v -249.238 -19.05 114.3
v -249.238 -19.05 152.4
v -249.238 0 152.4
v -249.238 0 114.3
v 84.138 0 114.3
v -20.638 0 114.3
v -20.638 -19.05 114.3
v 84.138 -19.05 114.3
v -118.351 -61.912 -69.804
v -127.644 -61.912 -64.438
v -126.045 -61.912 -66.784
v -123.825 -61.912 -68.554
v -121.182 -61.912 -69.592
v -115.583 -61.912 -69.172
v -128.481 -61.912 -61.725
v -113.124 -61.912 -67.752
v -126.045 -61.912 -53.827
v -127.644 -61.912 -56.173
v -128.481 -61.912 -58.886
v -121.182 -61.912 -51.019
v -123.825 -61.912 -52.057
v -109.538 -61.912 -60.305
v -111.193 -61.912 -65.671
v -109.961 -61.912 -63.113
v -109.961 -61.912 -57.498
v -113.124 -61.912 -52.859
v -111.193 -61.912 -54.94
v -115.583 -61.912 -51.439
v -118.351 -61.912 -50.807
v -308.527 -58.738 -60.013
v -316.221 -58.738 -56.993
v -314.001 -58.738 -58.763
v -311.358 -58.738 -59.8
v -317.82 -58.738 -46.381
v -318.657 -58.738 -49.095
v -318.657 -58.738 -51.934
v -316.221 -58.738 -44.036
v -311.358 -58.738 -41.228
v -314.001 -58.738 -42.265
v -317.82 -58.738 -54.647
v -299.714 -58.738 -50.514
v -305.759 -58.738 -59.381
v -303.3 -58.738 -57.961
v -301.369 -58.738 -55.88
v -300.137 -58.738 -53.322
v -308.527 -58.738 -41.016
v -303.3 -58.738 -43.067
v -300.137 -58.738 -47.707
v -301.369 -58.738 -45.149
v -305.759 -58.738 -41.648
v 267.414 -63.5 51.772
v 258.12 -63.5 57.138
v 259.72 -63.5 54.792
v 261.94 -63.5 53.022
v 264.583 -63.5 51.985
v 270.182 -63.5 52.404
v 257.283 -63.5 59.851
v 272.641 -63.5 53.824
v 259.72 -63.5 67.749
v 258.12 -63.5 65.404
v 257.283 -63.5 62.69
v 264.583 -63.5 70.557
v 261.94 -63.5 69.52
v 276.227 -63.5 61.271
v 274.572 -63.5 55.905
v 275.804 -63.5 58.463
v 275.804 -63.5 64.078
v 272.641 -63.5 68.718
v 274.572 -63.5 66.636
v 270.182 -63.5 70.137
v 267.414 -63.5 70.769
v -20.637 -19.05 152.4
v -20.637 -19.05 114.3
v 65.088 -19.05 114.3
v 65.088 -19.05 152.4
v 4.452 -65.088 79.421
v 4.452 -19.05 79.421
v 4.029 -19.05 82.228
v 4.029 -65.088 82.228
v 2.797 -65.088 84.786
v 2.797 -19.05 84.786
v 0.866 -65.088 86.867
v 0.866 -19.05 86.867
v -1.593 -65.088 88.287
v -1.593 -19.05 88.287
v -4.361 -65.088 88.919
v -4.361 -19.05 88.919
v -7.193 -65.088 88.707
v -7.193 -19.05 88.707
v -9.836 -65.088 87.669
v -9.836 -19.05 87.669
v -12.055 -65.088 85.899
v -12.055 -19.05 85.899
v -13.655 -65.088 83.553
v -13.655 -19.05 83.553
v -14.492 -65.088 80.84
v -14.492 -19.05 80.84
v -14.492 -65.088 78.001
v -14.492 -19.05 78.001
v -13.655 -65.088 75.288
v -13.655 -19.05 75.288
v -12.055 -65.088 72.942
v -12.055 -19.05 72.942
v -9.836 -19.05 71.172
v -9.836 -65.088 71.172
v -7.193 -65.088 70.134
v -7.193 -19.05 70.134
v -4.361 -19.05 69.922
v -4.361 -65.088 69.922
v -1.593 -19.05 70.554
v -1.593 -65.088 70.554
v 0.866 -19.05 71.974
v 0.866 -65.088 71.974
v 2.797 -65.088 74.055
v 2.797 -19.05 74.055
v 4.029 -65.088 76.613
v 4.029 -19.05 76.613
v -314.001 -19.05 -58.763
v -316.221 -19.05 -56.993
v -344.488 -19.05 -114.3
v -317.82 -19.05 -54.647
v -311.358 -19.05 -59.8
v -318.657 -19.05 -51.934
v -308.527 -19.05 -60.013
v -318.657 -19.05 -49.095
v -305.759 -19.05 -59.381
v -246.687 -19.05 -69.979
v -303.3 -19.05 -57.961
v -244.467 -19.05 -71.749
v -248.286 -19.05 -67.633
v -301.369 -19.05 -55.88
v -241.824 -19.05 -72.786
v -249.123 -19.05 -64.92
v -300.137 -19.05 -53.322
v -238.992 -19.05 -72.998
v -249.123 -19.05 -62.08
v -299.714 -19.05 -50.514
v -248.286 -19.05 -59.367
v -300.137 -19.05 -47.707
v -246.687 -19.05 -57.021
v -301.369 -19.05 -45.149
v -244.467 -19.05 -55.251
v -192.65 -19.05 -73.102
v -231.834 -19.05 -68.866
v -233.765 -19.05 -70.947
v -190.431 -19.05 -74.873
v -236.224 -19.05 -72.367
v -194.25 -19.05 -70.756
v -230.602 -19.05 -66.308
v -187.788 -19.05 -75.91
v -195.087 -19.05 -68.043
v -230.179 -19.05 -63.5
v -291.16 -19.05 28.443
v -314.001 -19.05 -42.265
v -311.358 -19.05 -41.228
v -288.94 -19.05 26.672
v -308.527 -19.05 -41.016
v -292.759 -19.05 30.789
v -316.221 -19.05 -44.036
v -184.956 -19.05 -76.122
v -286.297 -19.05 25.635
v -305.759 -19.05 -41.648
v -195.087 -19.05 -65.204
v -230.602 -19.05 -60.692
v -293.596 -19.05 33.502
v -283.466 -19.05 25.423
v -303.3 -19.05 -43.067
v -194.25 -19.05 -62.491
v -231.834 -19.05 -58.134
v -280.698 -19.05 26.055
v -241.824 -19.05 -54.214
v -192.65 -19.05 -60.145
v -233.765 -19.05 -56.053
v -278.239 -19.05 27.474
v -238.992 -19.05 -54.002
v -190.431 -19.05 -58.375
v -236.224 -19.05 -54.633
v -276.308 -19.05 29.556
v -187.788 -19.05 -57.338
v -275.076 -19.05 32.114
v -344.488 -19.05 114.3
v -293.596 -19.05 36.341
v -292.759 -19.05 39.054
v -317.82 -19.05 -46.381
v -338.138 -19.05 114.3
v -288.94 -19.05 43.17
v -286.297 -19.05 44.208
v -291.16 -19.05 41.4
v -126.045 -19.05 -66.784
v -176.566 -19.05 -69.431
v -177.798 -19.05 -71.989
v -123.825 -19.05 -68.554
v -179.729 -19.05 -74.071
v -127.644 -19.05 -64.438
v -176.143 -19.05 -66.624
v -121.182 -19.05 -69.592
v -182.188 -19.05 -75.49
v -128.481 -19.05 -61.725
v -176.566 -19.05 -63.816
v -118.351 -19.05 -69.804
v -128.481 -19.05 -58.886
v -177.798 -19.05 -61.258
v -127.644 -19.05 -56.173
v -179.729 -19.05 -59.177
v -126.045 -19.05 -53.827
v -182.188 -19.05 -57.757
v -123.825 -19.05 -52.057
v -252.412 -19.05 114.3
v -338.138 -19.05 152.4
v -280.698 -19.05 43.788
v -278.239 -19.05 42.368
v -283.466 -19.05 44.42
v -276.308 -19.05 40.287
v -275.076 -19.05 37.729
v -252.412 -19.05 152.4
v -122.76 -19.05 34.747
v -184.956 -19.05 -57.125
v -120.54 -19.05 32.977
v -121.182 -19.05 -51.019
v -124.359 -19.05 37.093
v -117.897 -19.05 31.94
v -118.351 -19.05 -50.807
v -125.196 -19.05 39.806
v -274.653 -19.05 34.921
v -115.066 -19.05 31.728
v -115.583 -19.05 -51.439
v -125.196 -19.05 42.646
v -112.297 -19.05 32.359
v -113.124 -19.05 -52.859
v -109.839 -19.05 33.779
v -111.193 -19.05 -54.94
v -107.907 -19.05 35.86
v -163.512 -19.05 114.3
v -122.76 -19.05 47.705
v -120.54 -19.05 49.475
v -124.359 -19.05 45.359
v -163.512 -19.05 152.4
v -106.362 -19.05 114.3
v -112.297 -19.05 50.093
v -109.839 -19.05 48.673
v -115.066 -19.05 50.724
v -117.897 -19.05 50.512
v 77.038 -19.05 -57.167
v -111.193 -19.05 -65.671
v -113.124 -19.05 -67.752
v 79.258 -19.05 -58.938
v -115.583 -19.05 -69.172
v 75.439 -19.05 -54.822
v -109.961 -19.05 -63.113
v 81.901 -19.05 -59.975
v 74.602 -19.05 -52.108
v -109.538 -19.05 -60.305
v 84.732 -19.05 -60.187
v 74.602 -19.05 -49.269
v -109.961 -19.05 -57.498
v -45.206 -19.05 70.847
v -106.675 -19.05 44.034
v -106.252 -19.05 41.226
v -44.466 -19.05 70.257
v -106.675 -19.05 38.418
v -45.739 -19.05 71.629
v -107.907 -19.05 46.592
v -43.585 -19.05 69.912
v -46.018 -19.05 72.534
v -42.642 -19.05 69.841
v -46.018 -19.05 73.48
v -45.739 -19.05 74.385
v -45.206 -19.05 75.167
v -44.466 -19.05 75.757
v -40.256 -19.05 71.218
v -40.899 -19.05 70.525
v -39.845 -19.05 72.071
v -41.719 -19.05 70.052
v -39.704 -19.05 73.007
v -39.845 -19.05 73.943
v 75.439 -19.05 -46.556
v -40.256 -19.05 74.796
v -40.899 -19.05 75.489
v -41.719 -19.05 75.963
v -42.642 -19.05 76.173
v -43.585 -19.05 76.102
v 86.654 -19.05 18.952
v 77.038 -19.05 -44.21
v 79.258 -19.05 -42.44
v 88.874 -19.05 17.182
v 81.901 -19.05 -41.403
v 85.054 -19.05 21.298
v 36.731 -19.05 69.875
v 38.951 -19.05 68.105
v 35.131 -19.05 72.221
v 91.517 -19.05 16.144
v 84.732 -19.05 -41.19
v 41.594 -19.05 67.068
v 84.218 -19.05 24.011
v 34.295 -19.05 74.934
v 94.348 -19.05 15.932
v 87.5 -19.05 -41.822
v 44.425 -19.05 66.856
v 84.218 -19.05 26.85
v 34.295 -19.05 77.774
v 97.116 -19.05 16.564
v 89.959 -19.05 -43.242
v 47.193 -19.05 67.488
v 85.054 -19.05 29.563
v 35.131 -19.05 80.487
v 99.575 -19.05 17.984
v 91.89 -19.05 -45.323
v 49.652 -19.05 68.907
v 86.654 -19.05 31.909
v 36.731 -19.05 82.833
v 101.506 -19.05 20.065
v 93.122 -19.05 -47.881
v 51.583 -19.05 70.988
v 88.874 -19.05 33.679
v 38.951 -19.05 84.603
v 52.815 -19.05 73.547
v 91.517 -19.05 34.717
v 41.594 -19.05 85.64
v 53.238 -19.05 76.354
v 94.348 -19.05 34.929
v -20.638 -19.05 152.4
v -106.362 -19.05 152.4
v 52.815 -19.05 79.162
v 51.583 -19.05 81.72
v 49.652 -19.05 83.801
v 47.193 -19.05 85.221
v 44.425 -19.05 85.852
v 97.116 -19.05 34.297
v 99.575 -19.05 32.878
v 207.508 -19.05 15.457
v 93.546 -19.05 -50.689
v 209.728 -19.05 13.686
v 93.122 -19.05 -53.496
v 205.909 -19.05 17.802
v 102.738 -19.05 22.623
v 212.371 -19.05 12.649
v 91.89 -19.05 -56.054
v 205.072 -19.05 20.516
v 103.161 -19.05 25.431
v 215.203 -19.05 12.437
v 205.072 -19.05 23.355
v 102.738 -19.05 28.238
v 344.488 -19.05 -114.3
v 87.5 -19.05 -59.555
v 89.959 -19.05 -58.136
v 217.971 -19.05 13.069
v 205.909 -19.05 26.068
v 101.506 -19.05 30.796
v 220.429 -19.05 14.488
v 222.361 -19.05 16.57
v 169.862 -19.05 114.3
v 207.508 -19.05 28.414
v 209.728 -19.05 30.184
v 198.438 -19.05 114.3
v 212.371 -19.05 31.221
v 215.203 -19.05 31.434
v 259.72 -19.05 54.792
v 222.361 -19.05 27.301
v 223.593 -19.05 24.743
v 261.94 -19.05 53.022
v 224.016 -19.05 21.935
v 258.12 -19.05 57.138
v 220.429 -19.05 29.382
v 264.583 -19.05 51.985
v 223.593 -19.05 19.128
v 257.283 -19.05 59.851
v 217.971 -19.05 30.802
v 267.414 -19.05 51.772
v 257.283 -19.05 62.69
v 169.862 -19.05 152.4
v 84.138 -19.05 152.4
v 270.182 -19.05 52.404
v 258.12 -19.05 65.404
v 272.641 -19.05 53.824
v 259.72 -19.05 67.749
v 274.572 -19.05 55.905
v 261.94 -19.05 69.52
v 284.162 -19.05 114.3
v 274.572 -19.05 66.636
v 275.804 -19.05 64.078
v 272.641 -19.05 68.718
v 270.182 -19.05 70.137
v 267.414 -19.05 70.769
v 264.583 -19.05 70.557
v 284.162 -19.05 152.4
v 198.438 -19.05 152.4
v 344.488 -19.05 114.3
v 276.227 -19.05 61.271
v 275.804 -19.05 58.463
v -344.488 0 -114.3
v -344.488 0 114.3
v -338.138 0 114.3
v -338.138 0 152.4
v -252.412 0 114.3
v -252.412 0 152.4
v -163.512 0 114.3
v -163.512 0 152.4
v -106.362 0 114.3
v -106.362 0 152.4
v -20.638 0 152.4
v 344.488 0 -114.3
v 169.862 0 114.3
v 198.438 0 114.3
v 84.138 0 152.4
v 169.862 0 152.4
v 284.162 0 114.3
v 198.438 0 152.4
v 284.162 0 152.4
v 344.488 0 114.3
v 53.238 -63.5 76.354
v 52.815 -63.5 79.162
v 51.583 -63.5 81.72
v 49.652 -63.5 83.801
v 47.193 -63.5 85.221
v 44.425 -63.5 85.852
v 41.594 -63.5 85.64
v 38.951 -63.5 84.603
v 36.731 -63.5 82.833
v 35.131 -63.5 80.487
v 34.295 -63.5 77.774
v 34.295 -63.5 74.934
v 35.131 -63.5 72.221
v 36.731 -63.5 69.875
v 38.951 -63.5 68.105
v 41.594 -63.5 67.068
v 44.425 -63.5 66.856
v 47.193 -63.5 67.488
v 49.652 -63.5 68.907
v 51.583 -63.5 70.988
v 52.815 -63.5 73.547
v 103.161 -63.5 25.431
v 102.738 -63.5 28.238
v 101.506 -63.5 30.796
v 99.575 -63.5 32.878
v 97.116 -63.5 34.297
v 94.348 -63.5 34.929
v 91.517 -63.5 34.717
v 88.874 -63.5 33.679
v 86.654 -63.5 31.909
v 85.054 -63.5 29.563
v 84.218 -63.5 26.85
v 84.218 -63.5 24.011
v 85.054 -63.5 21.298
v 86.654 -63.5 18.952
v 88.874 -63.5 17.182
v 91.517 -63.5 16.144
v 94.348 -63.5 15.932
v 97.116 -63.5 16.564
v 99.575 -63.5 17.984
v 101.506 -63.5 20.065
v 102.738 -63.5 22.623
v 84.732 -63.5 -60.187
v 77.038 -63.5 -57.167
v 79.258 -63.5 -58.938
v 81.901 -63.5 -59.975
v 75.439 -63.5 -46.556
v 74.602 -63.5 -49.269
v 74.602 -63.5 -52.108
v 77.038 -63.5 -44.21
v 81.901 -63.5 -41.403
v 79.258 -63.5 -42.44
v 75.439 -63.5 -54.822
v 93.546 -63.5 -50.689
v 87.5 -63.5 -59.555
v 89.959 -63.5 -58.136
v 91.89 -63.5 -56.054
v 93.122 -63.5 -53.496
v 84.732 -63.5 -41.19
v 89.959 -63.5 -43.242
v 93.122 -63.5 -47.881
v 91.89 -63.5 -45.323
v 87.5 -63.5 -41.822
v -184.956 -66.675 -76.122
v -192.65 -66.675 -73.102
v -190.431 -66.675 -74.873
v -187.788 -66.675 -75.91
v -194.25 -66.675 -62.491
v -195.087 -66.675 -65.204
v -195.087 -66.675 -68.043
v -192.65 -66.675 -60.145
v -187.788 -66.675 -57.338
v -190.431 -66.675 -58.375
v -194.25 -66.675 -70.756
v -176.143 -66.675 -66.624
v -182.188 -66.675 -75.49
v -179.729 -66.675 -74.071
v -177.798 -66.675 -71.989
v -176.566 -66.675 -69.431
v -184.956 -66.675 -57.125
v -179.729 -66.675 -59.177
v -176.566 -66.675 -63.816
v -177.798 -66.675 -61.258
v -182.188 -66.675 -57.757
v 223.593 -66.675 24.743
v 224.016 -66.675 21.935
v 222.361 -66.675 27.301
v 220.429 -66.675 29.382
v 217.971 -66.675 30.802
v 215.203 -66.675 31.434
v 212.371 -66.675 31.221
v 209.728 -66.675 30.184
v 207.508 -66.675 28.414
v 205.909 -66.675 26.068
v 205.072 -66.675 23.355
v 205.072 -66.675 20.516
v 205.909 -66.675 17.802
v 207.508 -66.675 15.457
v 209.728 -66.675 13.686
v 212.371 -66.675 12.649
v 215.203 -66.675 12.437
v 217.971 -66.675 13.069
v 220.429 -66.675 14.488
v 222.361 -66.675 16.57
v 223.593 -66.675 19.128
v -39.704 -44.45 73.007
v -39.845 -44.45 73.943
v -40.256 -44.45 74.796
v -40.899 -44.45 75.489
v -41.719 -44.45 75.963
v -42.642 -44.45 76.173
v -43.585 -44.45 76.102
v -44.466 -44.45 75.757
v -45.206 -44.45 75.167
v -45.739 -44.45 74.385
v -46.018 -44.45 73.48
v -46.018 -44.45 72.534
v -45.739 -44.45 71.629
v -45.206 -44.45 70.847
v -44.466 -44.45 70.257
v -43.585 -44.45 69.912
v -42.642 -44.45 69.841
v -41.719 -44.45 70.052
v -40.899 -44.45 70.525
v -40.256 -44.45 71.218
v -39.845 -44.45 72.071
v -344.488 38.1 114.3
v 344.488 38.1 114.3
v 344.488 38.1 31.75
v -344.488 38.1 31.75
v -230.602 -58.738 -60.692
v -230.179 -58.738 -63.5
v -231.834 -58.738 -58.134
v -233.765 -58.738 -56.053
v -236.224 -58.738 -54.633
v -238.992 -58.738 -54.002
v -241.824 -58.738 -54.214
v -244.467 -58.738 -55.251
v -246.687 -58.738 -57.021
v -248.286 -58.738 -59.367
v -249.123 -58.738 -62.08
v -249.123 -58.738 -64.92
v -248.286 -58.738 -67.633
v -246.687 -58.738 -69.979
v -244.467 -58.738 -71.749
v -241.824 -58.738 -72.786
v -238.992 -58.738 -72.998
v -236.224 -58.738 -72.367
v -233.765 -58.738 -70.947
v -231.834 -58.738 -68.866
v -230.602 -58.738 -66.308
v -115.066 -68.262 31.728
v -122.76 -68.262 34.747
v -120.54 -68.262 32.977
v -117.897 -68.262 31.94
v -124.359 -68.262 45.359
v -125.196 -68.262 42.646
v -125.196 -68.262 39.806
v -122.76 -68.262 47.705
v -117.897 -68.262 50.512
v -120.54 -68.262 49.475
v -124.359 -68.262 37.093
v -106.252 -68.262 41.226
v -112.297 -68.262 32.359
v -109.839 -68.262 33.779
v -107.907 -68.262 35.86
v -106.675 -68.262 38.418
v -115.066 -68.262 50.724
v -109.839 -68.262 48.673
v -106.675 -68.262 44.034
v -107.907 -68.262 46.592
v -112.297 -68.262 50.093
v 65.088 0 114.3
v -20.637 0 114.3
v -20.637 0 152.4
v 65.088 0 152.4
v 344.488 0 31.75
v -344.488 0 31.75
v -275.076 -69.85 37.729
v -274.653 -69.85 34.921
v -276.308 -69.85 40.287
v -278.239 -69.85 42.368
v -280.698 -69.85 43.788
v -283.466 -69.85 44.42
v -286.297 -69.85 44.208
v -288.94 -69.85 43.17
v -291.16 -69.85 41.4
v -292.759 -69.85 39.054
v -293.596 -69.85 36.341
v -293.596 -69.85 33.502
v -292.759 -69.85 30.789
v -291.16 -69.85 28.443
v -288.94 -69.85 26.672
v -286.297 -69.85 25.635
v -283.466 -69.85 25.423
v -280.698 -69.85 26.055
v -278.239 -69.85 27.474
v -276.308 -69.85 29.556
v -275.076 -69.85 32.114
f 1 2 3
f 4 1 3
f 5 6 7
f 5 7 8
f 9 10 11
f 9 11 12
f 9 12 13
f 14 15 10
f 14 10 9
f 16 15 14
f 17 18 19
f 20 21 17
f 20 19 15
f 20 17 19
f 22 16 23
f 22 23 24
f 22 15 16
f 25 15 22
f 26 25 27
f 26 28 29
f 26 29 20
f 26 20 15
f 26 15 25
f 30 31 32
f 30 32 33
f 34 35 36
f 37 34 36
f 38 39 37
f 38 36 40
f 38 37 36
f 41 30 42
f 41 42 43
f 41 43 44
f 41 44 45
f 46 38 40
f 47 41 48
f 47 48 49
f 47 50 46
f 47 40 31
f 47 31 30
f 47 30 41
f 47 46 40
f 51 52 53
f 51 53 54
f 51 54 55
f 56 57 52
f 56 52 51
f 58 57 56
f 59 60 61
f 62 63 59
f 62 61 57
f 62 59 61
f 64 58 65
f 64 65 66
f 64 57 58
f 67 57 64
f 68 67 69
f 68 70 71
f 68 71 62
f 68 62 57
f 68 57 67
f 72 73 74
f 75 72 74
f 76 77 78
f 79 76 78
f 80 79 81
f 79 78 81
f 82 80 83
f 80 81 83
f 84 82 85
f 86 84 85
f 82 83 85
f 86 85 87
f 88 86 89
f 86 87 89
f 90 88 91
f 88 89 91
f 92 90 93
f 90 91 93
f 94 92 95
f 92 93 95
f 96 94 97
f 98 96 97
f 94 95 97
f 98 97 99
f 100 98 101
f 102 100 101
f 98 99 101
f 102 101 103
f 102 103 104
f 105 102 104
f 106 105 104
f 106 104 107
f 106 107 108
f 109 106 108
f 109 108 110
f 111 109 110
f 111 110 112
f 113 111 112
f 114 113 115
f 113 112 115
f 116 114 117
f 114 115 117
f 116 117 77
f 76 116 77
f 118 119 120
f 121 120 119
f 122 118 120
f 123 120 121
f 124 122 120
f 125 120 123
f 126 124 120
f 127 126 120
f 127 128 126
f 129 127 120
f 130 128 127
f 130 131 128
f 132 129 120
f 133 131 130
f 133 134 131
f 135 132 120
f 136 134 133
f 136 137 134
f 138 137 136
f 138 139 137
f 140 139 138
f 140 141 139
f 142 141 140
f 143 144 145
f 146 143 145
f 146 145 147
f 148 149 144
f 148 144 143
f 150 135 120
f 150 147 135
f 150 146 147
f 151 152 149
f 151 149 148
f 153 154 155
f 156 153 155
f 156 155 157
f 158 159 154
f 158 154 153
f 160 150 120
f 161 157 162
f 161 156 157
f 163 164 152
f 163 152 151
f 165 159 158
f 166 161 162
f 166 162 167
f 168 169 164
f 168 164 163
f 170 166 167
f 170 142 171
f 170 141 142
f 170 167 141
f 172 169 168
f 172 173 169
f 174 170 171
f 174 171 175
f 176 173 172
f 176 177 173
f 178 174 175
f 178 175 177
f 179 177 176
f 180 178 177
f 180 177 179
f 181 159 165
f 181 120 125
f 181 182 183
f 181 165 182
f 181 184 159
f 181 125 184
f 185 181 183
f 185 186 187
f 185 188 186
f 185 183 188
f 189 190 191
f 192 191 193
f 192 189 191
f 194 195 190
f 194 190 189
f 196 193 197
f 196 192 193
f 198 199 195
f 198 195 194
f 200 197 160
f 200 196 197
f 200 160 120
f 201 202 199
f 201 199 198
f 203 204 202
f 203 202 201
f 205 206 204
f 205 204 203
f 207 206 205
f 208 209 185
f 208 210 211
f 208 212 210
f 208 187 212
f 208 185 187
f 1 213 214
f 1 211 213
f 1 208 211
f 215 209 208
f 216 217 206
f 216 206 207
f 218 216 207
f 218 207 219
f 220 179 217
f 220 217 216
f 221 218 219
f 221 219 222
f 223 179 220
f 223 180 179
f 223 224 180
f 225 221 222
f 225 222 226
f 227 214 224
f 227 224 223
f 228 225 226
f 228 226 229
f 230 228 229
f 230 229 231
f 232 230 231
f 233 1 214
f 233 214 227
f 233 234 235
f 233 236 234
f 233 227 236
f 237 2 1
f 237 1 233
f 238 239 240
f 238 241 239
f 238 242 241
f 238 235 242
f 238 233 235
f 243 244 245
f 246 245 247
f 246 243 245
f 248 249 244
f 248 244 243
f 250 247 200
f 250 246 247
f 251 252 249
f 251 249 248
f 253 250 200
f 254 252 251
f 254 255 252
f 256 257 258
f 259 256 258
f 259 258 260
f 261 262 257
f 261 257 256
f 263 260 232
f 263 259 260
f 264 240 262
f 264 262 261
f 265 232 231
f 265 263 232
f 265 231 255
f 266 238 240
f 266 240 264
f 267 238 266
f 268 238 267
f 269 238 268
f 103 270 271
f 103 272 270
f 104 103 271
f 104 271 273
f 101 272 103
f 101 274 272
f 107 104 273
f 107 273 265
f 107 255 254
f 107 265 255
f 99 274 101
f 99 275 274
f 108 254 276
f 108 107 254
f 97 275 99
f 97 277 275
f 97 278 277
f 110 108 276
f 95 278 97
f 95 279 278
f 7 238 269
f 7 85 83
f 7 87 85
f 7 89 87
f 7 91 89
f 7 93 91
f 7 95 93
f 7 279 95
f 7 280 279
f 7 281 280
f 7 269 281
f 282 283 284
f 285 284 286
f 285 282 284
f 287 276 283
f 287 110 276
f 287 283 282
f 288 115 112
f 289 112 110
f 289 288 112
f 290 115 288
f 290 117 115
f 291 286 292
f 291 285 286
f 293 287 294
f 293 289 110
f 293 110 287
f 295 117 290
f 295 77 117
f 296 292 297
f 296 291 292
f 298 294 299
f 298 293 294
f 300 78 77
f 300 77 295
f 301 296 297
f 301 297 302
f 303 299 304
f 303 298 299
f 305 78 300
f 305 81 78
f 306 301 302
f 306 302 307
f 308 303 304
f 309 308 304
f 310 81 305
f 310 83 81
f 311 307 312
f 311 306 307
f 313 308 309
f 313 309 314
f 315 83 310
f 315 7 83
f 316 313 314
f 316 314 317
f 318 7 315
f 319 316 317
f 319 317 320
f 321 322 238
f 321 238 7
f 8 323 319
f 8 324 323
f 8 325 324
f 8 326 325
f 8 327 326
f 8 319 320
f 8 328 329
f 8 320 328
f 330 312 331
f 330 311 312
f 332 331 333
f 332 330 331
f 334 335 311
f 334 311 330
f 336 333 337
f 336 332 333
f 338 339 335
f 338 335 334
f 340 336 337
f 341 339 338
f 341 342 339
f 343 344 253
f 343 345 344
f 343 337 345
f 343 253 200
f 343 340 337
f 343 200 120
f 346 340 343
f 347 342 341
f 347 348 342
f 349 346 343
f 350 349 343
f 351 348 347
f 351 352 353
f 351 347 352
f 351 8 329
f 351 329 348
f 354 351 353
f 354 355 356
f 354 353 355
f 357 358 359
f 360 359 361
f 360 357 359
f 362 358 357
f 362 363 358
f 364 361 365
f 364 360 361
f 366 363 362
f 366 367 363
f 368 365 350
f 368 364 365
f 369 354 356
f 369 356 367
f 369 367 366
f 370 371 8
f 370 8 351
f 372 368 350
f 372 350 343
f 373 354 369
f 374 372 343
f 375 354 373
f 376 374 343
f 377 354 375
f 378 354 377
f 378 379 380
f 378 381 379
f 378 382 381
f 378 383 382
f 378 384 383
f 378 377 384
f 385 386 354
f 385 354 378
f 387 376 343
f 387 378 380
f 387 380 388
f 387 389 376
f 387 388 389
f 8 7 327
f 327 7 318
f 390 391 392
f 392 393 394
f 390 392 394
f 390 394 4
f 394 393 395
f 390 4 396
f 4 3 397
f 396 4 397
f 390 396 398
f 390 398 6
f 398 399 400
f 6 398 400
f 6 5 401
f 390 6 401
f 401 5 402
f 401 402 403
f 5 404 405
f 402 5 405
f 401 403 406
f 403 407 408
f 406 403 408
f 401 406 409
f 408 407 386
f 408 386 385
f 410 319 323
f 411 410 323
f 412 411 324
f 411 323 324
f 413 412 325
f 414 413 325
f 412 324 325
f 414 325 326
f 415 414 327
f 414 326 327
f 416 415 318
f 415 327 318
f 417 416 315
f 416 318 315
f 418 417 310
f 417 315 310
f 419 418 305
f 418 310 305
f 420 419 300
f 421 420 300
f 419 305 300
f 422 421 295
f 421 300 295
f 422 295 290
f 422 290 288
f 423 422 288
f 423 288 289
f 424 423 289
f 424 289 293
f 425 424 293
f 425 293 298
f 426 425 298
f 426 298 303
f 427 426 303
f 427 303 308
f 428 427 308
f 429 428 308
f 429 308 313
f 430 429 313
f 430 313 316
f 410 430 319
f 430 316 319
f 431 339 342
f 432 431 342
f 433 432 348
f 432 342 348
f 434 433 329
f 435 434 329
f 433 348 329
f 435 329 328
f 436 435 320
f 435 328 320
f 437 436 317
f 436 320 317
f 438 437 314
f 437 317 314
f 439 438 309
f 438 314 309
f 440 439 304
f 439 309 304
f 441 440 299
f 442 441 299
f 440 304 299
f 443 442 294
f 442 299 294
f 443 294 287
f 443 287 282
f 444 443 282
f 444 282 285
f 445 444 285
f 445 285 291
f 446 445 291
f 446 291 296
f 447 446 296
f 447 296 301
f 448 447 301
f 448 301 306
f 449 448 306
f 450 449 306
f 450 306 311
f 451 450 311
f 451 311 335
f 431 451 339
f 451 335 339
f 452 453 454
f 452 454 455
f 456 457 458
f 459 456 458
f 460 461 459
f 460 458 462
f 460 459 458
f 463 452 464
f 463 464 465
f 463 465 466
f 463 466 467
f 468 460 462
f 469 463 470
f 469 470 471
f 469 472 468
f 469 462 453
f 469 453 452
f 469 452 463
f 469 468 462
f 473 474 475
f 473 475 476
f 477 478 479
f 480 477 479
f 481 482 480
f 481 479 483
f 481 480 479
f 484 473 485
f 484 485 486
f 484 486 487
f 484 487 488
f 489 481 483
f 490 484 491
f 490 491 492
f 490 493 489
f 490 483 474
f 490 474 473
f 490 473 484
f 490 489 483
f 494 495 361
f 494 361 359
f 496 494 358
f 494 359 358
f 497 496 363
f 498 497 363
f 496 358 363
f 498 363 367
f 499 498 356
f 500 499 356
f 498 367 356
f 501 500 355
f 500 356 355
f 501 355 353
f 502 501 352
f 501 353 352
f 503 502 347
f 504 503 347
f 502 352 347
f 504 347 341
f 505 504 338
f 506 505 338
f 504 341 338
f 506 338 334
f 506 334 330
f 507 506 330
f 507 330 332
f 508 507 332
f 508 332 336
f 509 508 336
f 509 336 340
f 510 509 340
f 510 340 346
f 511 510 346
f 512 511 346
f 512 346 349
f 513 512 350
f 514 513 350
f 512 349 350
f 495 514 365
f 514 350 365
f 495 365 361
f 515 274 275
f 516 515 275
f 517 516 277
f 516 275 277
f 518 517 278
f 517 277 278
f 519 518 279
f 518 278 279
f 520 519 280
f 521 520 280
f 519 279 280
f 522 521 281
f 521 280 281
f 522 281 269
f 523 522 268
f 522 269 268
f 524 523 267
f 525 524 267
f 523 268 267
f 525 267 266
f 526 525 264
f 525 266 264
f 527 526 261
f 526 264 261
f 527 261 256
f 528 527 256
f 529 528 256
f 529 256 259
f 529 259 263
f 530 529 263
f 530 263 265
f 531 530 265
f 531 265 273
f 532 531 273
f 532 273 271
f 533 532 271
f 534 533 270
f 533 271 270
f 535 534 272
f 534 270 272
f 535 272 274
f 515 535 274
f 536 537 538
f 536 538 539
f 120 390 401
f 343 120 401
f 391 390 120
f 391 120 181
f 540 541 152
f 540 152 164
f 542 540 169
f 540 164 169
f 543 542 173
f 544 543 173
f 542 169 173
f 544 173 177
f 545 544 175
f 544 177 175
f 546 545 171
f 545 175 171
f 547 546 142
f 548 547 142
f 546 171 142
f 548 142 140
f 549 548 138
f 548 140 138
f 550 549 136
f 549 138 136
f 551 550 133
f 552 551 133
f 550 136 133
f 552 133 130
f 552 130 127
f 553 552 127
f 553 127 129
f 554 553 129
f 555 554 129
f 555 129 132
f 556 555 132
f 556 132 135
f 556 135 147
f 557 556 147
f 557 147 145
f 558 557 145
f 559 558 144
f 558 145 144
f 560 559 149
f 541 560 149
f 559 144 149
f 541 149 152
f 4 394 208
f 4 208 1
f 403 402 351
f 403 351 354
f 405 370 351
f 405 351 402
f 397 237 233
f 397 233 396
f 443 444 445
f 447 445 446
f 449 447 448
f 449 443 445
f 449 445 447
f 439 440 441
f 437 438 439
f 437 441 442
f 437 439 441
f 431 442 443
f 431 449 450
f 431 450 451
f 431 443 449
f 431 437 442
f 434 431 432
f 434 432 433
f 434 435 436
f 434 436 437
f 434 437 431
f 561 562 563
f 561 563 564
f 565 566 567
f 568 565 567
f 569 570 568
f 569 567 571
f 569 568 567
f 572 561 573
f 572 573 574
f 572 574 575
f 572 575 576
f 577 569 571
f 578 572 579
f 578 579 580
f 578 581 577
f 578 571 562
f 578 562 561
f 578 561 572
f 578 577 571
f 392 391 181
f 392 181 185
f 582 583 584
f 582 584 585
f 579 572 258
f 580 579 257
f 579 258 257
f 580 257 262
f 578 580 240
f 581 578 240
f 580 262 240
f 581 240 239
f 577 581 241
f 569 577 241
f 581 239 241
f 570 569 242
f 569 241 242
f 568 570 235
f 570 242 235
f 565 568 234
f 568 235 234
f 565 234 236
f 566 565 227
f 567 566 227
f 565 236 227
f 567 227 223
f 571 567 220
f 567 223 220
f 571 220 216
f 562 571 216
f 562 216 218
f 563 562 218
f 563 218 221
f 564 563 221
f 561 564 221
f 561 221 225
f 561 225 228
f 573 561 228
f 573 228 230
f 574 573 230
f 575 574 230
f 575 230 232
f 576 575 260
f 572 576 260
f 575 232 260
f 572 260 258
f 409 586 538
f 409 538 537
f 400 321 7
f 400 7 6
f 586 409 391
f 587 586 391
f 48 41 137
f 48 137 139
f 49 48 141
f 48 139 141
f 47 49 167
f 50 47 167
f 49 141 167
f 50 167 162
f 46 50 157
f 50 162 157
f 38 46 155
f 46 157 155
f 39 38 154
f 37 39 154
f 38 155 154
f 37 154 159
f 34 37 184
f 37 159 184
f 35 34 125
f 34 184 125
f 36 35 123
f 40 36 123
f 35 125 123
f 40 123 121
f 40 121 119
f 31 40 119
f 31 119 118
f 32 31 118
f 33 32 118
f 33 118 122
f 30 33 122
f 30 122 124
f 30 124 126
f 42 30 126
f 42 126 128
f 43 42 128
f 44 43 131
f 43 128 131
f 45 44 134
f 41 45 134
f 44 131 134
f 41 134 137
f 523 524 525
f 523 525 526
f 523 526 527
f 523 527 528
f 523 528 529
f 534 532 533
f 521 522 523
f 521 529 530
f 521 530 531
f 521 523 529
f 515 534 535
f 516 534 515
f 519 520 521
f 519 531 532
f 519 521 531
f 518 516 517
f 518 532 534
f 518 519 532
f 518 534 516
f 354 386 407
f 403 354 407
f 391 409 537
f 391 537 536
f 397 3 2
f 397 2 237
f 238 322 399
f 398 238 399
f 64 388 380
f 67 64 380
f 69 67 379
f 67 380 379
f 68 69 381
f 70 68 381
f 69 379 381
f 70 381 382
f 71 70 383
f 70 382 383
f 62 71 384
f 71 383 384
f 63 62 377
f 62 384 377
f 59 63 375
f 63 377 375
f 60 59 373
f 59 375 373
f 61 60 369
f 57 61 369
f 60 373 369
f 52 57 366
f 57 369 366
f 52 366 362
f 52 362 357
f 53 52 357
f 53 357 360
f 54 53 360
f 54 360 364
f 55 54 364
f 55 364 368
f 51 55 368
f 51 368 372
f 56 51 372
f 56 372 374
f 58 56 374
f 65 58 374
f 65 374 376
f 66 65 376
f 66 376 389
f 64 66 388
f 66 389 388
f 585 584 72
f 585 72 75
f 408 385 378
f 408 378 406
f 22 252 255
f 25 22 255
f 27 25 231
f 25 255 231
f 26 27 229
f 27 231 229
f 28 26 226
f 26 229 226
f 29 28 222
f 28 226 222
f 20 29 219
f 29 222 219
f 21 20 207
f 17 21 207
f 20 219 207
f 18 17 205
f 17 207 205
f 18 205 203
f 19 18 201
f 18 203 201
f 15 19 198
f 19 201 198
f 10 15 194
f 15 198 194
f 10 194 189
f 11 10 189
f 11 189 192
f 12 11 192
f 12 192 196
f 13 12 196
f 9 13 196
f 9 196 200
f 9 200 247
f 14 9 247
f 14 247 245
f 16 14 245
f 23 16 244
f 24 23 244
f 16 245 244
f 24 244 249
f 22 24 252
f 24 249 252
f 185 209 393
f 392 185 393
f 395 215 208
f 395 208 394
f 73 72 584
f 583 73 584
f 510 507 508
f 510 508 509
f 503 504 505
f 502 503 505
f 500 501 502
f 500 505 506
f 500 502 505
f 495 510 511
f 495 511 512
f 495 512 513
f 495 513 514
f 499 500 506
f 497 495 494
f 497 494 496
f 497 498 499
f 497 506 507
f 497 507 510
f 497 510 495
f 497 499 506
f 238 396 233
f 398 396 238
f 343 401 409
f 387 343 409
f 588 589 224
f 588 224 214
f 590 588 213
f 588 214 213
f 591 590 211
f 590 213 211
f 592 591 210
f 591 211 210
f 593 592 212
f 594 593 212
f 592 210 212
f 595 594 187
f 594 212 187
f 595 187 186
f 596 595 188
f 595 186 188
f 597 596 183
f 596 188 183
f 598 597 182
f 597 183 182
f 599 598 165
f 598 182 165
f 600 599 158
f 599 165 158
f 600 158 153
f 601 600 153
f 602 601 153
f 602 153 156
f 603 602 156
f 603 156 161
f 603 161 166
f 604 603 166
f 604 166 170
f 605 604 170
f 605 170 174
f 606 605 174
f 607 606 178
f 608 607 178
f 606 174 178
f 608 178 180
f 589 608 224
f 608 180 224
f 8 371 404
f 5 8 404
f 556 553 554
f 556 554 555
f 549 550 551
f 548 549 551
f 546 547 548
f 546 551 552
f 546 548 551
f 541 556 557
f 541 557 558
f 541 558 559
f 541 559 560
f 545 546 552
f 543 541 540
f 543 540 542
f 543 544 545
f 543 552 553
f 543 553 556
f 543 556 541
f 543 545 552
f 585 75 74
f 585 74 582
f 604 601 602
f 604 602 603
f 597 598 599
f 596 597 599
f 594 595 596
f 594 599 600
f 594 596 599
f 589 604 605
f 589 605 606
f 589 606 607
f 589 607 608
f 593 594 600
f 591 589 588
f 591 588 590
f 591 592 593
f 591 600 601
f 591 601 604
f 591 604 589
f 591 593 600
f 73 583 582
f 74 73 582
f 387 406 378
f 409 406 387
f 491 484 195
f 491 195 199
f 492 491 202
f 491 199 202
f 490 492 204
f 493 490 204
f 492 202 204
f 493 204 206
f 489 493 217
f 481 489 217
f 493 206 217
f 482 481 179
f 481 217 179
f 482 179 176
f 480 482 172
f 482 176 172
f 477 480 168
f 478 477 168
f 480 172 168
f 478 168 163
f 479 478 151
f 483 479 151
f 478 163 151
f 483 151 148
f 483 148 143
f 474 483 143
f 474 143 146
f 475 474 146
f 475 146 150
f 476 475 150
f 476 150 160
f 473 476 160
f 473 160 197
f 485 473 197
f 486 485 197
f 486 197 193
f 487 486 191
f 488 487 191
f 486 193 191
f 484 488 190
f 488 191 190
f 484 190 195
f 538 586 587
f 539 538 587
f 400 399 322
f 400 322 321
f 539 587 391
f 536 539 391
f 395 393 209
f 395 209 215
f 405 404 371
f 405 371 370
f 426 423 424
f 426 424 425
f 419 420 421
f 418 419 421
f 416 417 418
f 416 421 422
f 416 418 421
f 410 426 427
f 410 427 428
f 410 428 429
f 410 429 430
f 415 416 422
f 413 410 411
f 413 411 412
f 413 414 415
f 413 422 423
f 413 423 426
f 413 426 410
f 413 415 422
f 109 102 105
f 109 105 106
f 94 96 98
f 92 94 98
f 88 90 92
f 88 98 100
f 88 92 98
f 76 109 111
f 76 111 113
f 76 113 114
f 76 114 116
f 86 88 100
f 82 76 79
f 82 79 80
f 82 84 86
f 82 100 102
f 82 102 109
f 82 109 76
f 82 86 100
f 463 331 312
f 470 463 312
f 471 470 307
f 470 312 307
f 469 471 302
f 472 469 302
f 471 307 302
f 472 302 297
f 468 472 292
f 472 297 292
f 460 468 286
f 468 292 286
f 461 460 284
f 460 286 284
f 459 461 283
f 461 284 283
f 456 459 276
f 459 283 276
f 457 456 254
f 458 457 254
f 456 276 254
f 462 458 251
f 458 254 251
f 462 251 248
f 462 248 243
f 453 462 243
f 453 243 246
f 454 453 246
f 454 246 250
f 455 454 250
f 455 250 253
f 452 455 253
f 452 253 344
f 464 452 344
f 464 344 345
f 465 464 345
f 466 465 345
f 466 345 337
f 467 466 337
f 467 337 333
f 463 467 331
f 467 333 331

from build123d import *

# Parameters (mm, degrees)
F0_W      = 688.975
F0_H      = 228.6
F1_DEPTH  = 19.05
F2_W      = 688.975
F2_H      = 82.55
F3_DEPTH  = 38.1
F4_R      = 9.525
F5_DEPTH  = 50.8
F6_DEPTH  = 49.2125
F7_DEPTH  = 46.0375
F8_DEPTH  = 44.45
F9_DEPTH  = 44.45
F10_DEPTH = 39.6875
F11_DEPTH = 39.6875
F12_DEPTH = 47.625
F13_DEPTH = 42.8625
F14_DEPTH = 44.45
F15_DEPTH = 47.625
F16_DEPTH = 44.45
F4_R_2    = 3.175
F17_DEPTH = 25.4
F18_W     = 85.725
F18_H     = 19.05
F19_DEPTH = 38.1
F20_DEPTH = 38.1
F21_DEPTH = 38.1
F22_DEPTH = 38.1


with BuildPart() as f1:
    # F0 (on Front) → F1 (new body)
    with BuildSketch(Plane.XZ):
        Rectangle(F0_W, F0_H)
    extrude(amount=F1_DEPTH)

    # F4 (on face) → F5 (join)
    with BuildSketch(Plane.XZ.offset(19.05)):
        with Locations((-284.177719027, 34.921354228)):
            Circle(F4_R)
    extrude(amount=F5_DEPTH)

    # F4 (on face) → F6 (join)
    with BuildSketch(Plane.XZ.offset(19.05)):
        with Locations((-115.7773256969, 41.2260214307)):
            Circle(F4_R)
    extrude(amount=F6_DEPTH)

    # F4 (on face) → F7 (join)
    with BuildSketch(Plane.XZ.offset(19.05)):
        with Locations((-5.0731406292, 79.4205398983)):
            Circle(F4_R)
    extrude(amount=F7_DEPTH)

    # F4 (on face) → F8 (join)
    with BuildSketch(Plane.XZ.offset(19.05)):
        with Locations((43.7131791432, 76.3541009185)):
            Circle(F4_R)
    extrude(amount=F8_DEPTH)

    # F4 (on face) → F9 (join)
    with BuildSketch(Plane.XZ.offset(19.05)):
        with Locations((266.7021014949, 61.2707650235)):
            Circle(F4_R)
    extrude(amount=F9_DEPTH)

    # F4 (on face) → F10 (join)
    with BuildSketch(Plane.XZ.offset(19.05)):
        with Locations((-309.2386653451, -50.5142142372)):
            Circle(F4_R)
    extrude(amount=F10_DEPTH)

    # F4 (on face) → F11 (join)
    with BuildSketch(Plane.XZ.offset(19.05)):
        with Locations((-239.704221487, -63.5)):
            Circle(F4_R)
    extrude(amount=F11_DEPTH)

    # F4 (on face) → F12 (join)
    with BuildSketch(Plane.XZ.offset(19.05)):
        with Locations((-185.6680512428, -66.6236951947)):
            Circle(F4_R)
    extrude(amount=F12_DEPTH)

    # F4 (on face) → F13 (join)
    with BuildSketch(Plane.XZ.offset(19.05)):
        with Locations((-119.0625, -60.3054687381)):
            Circle(F4_R)
    extrude(amount=F13_DEPTH)

    # F4 (on face) → F14 (join)
    with BuildSketch(Plane.XZ.offset(19.05)):
        with Locations((93.636199832, 25.4305675626)):
            Circle(F4_R)
    extrude(amount=F14_DEPTH)

    # F4 (on face) → F15 (join)
    with BuildSketch(Plane.XZ.offset(19.05)):
        with Locations((214.4906967878, 21.935204044)):
            Circle(F4_R)
    extrude(amount=F15_DEPTH)

    # F4 (on face) → F16 (join)
    with BuildSketch(Plane.XZ.offset(19.05)):
        with Locations((84.0205475688, -50.6887696683)):
            Circle(F4_R)
    extrude(amount=F16_DEPTH)

    # F4 (on face) → F17 (join)
    with BuildSketch(Plane.XZ.offset(19.05)):
        with Locations((-42.8788997233, 73.0070248246)):
            Circle(F4_R_2)
    extrude(amount=F17_DEPTH)

    # F18 (on face) → F19 (join)
    with BuildSketch(Plane.XY.offset(114.3)):
        with Locations((-295.275, -9.525)):
            Rectangle(F18_W, F18_H)
    extrude(amount=F19_DEPTH)

    # F18 (on face) → F20 (join)
    with BuildSketch(Plane.XY.offset(114.3)):
        with Locations((-206.375, -9.525)):
            Rectangle(F18_W, F18_H)
        with Locations((-63.5, -9.525)):
            Rectangle(F18_W, F18_H)
    extrude(amount=F20_DEPTH)

    # F18 (on face) → F22 (join)
    with BuildSketch(Plane.XY.offset(114.3)):
        with Locations((127, -9.525)):
            Rectangle(F18_W, F18_H)
        with Locations((241.3, -9.525)):
            Rectangle(F18_W, F18_H)
    extrude(amount=F22_DEPTH)


with BuildPart() as f3:
    # F2 (on face) → F3 (new body)
    with BuildSketch(Plane(origin=(0, 0, 0), x_dir=(-1, 0, 0), z_dir=(0, 1, 0))):
        with Locations((0, 73.025)):
            Rectangle(F2_W, F2_H)
    extrude(amount=F3_DEPTH)


with BuildPart() as f21:
    # F18 (on face) → F21 (new body)
    with BuildSketch(Plane.XY.offset(114.3)):
        with Locations((22.225, -9.525)):
            Rectangle(F18_W, F18_H)
    extrude(amount=F21_DEPTH)


solid = Compound([f1.part, f3.part, f21.part])
